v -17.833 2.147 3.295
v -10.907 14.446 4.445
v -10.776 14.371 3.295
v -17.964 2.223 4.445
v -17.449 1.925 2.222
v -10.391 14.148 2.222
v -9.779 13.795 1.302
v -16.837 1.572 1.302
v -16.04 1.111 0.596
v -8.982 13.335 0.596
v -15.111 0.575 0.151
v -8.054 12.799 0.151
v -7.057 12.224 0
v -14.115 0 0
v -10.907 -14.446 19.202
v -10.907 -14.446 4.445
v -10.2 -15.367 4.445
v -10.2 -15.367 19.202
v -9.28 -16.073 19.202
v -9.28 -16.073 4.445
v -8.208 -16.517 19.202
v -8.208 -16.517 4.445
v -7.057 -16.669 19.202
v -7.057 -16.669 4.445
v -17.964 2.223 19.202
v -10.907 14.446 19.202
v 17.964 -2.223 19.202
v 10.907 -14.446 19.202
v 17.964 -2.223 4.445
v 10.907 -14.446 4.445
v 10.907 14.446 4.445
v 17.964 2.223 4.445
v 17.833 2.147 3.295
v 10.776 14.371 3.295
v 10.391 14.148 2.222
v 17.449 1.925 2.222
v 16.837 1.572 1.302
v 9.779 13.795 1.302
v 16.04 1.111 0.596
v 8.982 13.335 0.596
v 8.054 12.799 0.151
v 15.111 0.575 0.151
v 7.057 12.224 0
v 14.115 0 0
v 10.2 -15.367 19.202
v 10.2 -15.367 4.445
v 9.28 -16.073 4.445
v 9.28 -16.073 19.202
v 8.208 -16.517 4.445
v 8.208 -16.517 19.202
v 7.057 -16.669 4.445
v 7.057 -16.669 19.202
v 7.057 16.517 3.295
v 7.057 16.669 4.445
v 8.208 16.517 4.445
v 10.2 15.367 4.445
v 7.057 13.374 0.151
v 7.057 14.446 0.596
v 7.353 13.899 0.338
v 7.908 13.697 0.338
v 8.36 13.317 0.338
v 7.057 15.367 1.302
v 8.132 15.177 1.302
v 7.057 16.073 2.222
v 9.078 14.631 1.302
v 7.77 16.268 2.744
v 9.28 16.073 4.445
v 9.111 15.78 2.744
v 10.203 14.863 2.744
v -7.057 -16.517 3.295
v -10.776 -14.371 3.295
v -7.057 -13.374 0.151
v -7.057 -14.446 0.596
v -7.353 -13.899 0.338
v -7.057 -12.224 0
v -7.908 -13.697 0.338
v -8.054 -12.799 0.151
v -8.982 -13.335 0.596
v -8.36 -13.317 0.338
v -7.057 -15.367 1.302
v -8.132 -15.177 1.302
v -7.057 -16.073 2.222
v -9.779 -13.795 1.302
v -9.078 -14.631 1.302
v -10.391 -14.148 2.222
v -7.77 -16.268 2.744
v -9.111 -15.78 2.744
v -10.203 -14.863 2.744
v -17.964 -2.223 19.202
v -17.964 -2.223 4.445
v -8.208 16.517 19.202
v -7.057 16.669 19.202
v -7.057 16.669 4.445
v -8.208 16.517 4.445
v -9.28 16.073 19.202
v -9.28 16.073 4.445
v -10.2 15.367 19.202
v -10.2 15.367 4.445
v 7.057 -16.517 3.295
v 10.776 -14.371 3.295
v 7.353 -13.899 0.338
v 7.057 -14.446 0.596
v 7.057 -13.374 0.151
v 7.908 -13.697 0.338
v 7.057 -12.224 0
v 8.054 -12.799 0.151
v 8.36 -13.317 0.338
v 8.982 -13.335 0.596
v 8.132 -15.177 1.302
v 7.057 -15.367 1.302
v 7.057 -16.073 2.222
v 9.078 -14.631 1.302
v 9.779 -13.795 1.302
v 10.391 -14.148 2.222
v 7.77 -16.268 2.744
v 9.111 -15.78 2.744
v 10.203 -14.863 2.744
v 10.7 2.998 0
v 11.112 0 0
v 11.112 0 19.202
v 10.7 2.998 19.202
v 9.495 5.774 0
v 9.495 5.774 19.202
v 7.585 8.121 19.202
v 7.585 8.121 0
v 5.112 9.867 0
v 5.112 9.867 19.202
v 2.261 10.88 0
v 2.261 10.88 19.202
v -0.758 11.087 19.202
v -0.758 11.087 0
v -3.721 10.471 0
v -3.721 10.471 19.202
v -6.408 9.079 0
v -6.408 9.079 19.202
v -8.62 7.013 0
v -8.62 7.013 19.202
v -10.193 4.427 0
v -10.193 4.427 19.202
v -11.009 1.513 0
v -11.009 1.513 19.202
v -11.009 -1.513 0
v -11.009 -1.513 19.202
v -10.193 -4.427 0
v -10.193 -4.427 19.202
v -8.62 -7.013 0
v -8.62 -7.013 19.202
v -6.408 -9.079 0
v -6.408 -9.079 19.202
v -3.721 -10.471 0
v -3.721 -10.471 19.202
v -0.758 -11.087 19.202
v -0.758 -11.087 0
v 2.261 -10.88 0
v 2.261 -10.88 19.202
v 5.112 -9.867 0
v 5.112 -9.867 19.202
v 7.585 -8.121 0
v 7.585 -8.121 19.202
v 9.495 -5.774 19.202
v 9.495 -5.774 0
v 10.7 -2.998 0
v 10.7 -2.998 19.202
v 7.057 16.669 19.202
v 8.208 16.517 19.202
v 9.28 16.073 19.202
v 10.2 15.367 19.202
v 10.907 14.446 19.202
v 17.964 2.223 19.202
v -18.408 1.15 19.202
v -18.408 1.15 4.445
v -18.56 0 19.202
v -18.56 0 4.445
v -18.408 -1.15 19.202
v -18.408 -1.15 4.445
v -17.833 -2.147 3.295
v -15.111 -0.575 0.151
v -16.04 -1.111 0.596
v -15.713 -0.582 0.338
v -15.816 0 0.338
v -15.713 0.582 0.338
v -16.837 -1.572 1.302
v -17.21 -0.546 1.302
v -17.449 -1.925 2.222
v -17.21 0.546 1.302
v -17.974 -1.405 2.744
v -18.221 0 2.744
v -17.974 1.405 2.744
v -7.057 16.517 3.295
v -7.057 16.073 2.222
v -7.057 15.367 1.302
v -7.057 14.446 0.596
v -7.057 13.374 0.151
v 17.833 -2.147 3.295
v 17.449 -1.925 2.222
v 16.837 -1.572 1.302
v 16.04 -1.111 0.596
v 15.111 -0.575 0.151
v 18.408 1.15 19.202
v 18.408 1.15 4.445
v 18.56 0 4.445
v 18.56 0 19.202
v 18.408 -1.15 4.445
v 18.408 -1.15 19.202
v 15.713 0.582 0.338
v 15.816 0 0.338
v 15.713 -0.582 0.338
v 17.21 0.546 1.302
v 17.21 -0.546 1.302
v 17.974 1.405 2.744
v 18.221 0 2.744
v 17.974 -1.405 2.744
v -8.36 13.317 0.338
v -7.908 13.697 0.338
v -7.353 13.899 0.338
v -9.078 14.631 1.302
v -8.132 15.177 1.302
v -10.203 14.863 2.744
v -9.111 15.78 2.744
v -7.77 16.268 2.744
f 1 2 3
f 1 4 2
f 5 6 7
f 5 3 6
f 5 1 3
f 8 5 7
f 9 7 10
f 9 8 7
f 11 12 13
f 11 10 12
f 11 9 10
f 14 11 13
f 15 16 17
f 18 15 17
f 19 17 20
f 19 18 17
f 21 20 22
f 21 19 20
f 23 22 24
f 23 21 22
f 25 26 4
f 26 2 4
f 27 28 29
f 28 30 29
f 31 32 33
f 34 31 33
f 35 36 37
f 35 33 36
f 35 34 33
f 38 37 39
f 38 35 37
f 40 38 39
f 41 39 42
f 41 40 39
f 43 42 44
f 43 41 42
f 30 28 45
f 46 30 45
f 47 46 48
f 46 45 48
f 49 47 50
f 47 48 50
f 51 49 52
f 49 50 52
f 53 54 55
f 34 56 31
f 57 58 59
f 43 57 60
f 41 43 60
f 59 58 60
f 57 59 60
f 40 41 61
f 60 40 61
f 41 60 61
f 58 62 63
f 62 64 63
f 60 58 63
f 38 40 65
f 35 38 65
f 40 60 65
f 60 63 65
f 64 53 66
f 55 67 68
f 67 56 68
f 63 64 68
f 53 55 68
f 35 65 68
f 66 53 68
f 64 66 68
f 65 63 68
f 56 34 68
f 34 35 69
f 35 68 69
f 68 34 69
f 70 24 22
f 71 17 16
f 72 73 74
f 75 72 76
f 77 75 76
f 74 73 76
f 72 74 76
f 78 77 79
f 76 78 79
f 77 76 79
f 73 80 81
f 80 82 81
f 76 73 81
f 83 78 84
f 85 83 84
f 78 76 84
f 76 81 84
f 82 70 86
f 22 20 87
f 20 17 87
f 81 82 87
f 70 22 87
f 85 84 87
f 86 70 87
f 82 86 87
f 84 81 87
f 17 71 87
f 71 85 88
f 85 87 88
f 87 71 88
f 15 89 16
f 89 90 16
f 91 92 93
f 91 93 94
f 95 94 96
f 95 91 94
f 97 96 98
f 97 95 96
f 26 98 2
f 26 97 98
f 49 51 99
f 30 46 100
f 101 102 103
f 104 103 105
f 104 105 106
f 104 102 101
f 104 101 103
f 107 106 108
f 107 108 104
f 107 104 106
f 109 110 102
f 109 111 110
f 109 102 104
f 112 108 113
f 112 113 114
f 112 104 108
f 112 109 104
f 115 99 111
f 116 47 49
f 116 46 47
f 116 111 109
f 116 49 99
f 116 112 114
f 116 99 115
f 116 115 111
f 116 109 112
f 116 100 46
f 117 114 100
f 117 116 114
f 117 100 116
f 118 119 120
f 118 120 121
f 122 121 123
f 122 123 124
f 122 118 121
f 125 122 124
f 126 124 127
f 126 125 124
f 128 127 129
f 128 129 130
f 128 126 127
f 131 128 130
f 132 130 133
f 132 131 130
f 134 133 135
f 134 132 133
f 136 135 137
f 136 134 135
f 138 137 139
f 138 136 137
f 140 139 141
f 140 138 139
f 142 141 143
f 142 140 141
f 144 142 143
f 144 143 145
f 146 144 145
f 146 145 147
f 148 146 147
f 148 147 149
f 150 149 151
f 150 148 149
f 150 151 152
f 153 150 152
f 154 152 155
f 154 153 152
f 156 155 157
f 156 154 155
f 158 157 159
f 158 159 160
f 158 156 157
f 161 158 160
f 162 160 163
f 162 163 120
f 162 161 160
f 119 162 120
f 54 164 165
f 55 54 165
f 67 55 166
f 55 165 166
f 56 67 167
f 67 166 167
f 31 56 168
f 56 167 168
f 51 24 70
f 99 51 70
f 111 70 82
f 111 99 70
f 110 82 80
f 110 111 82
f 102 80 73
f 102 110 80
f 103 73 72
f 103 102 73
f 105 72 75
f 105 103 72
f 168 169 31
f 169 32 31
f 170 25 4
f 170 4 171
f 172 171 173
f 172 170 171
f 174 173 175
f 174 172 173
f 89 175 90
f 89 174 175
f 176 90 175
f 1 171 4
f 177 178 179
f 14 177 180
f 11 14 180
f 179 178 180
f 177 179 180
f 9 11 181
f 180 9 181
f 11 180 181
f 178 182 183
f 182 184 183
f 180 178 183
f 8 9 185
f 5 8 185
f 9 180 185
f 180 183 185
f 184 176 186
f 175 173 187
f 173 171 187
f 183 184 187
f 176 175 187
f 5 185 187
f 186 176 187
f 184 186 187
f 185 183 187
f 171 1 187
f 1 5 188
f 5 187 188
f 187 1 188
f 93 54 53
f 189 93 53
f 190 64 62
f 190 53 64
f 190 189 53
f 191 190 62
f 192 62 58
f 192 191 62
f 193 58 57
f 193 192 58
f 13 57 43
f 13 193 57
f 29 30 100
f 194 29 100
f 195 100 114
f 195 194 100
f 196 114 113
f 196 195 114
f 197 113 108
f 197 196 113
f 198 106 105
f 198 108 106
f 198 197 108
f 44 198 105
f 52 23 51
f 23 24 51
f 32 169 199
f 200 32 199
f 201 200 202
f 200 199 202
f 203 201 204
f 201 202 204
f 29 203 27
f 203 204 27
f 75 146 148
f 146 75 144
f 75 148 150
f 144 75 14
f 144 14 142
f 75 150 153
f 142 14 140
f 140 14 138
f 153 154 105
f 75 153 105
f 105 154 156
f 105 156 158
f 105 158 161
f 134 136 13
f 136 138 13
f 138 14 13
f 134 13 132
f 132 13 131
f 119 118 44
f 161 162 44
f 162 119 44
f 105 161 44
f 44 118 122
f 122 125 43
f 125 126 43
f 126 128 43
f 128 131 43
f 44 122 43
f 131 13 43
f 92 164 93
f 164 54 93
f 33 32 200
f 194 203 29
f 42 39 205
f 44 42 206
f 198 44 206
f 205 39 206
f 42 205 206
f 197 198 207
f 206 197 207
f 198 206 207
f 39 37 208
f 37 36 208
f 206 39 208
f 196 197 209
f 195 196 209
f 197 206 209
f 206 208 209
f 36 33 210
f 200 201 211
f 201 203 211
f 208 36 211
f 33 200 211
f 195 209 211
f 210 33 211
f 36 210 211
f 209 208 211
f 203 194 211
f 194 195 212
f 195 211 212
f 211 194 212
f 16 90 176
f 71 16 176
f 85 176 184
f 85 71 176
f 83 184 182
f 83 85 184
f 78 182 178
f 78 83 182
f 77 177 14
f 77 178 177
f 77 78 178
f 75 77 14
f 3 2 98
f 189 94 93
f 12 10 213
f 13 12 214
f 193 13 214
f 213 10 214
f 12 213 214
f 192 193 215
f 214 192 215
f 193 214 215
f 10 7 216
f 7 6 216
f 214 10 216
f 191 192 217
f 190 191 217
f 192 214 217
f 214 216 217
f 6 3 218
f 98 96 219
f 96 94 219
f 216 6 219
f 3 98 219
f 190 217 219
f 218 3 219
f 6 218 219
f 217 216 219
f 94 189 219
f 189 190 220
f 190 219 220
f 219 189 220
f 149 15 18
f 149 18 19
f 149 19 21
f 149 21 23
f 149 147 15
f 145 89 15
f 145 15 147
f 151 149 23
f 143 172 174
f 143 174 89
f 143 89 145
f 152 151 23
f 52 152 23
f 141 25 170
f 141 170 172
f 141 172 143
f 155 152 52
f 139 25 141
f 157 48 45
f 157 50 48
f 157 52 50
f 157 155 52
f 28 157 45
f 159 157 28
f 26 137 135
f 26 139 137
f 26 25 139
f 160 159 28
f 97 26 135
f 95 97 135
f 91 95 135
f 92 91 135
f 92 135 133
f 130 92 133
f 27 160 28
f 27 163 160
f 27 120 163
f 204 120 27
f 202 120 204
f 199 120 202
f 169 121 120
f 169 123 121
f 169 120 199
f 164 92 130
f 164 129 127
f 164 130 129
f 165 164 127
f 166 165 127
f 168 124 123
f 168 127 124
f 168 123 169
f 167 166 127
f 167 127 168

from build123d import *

# Parameters (mm, degrees)
F0_R     = 7.9375
F1_DEPTH = 13.716
F2_R     = 3.175
F3_SCALE = 1.4


with BuildPart() as f1:
    # F0 (on Top) → F1 (new body)
    with BuildSketch(Plane.XY):
        Polygon((6.8740766425, 11.90625), (-6.8740766425, 11.90625), (-13.7481532851, 0), (-6.8740766425, -11.90625), (6.8740766425, -11.90625), (13.7481532851, 0), align=None)
        Circle(F0_R, mode=Mode.SUBTRACT)
    extrude(amount=F1_DEPTH)

    # F2
    f2_edges = [f1.edges().sort_by_distance(p)[0] for p in [
        (-13.748153, 0, 6.858),
        (10.311115, -5.953125, 0),
        (13.748153, 0, 6.858),
        (6.874077, -11.90625, 6.858),
        (-6.874077, -11.90625, 6.858),
        (6.874077, 11.90625, 6.858),
        (-6.874077, 11.90625, 6.858),
        (0, -11.90625, 0),
        (-10.311115, -5.953125, 0),
        (-10.311115, 5.953125, 0),
        (0, 11.90625, 0),
        (10.311115, 5.953125, 0),
    ]]
    fillet(f2_edges, radius=F2_R)


with BuildPart() as f1_1:
    # F3: moved
    add(f1.part.scale(F3_SCALE))


solid = f1_1.part
